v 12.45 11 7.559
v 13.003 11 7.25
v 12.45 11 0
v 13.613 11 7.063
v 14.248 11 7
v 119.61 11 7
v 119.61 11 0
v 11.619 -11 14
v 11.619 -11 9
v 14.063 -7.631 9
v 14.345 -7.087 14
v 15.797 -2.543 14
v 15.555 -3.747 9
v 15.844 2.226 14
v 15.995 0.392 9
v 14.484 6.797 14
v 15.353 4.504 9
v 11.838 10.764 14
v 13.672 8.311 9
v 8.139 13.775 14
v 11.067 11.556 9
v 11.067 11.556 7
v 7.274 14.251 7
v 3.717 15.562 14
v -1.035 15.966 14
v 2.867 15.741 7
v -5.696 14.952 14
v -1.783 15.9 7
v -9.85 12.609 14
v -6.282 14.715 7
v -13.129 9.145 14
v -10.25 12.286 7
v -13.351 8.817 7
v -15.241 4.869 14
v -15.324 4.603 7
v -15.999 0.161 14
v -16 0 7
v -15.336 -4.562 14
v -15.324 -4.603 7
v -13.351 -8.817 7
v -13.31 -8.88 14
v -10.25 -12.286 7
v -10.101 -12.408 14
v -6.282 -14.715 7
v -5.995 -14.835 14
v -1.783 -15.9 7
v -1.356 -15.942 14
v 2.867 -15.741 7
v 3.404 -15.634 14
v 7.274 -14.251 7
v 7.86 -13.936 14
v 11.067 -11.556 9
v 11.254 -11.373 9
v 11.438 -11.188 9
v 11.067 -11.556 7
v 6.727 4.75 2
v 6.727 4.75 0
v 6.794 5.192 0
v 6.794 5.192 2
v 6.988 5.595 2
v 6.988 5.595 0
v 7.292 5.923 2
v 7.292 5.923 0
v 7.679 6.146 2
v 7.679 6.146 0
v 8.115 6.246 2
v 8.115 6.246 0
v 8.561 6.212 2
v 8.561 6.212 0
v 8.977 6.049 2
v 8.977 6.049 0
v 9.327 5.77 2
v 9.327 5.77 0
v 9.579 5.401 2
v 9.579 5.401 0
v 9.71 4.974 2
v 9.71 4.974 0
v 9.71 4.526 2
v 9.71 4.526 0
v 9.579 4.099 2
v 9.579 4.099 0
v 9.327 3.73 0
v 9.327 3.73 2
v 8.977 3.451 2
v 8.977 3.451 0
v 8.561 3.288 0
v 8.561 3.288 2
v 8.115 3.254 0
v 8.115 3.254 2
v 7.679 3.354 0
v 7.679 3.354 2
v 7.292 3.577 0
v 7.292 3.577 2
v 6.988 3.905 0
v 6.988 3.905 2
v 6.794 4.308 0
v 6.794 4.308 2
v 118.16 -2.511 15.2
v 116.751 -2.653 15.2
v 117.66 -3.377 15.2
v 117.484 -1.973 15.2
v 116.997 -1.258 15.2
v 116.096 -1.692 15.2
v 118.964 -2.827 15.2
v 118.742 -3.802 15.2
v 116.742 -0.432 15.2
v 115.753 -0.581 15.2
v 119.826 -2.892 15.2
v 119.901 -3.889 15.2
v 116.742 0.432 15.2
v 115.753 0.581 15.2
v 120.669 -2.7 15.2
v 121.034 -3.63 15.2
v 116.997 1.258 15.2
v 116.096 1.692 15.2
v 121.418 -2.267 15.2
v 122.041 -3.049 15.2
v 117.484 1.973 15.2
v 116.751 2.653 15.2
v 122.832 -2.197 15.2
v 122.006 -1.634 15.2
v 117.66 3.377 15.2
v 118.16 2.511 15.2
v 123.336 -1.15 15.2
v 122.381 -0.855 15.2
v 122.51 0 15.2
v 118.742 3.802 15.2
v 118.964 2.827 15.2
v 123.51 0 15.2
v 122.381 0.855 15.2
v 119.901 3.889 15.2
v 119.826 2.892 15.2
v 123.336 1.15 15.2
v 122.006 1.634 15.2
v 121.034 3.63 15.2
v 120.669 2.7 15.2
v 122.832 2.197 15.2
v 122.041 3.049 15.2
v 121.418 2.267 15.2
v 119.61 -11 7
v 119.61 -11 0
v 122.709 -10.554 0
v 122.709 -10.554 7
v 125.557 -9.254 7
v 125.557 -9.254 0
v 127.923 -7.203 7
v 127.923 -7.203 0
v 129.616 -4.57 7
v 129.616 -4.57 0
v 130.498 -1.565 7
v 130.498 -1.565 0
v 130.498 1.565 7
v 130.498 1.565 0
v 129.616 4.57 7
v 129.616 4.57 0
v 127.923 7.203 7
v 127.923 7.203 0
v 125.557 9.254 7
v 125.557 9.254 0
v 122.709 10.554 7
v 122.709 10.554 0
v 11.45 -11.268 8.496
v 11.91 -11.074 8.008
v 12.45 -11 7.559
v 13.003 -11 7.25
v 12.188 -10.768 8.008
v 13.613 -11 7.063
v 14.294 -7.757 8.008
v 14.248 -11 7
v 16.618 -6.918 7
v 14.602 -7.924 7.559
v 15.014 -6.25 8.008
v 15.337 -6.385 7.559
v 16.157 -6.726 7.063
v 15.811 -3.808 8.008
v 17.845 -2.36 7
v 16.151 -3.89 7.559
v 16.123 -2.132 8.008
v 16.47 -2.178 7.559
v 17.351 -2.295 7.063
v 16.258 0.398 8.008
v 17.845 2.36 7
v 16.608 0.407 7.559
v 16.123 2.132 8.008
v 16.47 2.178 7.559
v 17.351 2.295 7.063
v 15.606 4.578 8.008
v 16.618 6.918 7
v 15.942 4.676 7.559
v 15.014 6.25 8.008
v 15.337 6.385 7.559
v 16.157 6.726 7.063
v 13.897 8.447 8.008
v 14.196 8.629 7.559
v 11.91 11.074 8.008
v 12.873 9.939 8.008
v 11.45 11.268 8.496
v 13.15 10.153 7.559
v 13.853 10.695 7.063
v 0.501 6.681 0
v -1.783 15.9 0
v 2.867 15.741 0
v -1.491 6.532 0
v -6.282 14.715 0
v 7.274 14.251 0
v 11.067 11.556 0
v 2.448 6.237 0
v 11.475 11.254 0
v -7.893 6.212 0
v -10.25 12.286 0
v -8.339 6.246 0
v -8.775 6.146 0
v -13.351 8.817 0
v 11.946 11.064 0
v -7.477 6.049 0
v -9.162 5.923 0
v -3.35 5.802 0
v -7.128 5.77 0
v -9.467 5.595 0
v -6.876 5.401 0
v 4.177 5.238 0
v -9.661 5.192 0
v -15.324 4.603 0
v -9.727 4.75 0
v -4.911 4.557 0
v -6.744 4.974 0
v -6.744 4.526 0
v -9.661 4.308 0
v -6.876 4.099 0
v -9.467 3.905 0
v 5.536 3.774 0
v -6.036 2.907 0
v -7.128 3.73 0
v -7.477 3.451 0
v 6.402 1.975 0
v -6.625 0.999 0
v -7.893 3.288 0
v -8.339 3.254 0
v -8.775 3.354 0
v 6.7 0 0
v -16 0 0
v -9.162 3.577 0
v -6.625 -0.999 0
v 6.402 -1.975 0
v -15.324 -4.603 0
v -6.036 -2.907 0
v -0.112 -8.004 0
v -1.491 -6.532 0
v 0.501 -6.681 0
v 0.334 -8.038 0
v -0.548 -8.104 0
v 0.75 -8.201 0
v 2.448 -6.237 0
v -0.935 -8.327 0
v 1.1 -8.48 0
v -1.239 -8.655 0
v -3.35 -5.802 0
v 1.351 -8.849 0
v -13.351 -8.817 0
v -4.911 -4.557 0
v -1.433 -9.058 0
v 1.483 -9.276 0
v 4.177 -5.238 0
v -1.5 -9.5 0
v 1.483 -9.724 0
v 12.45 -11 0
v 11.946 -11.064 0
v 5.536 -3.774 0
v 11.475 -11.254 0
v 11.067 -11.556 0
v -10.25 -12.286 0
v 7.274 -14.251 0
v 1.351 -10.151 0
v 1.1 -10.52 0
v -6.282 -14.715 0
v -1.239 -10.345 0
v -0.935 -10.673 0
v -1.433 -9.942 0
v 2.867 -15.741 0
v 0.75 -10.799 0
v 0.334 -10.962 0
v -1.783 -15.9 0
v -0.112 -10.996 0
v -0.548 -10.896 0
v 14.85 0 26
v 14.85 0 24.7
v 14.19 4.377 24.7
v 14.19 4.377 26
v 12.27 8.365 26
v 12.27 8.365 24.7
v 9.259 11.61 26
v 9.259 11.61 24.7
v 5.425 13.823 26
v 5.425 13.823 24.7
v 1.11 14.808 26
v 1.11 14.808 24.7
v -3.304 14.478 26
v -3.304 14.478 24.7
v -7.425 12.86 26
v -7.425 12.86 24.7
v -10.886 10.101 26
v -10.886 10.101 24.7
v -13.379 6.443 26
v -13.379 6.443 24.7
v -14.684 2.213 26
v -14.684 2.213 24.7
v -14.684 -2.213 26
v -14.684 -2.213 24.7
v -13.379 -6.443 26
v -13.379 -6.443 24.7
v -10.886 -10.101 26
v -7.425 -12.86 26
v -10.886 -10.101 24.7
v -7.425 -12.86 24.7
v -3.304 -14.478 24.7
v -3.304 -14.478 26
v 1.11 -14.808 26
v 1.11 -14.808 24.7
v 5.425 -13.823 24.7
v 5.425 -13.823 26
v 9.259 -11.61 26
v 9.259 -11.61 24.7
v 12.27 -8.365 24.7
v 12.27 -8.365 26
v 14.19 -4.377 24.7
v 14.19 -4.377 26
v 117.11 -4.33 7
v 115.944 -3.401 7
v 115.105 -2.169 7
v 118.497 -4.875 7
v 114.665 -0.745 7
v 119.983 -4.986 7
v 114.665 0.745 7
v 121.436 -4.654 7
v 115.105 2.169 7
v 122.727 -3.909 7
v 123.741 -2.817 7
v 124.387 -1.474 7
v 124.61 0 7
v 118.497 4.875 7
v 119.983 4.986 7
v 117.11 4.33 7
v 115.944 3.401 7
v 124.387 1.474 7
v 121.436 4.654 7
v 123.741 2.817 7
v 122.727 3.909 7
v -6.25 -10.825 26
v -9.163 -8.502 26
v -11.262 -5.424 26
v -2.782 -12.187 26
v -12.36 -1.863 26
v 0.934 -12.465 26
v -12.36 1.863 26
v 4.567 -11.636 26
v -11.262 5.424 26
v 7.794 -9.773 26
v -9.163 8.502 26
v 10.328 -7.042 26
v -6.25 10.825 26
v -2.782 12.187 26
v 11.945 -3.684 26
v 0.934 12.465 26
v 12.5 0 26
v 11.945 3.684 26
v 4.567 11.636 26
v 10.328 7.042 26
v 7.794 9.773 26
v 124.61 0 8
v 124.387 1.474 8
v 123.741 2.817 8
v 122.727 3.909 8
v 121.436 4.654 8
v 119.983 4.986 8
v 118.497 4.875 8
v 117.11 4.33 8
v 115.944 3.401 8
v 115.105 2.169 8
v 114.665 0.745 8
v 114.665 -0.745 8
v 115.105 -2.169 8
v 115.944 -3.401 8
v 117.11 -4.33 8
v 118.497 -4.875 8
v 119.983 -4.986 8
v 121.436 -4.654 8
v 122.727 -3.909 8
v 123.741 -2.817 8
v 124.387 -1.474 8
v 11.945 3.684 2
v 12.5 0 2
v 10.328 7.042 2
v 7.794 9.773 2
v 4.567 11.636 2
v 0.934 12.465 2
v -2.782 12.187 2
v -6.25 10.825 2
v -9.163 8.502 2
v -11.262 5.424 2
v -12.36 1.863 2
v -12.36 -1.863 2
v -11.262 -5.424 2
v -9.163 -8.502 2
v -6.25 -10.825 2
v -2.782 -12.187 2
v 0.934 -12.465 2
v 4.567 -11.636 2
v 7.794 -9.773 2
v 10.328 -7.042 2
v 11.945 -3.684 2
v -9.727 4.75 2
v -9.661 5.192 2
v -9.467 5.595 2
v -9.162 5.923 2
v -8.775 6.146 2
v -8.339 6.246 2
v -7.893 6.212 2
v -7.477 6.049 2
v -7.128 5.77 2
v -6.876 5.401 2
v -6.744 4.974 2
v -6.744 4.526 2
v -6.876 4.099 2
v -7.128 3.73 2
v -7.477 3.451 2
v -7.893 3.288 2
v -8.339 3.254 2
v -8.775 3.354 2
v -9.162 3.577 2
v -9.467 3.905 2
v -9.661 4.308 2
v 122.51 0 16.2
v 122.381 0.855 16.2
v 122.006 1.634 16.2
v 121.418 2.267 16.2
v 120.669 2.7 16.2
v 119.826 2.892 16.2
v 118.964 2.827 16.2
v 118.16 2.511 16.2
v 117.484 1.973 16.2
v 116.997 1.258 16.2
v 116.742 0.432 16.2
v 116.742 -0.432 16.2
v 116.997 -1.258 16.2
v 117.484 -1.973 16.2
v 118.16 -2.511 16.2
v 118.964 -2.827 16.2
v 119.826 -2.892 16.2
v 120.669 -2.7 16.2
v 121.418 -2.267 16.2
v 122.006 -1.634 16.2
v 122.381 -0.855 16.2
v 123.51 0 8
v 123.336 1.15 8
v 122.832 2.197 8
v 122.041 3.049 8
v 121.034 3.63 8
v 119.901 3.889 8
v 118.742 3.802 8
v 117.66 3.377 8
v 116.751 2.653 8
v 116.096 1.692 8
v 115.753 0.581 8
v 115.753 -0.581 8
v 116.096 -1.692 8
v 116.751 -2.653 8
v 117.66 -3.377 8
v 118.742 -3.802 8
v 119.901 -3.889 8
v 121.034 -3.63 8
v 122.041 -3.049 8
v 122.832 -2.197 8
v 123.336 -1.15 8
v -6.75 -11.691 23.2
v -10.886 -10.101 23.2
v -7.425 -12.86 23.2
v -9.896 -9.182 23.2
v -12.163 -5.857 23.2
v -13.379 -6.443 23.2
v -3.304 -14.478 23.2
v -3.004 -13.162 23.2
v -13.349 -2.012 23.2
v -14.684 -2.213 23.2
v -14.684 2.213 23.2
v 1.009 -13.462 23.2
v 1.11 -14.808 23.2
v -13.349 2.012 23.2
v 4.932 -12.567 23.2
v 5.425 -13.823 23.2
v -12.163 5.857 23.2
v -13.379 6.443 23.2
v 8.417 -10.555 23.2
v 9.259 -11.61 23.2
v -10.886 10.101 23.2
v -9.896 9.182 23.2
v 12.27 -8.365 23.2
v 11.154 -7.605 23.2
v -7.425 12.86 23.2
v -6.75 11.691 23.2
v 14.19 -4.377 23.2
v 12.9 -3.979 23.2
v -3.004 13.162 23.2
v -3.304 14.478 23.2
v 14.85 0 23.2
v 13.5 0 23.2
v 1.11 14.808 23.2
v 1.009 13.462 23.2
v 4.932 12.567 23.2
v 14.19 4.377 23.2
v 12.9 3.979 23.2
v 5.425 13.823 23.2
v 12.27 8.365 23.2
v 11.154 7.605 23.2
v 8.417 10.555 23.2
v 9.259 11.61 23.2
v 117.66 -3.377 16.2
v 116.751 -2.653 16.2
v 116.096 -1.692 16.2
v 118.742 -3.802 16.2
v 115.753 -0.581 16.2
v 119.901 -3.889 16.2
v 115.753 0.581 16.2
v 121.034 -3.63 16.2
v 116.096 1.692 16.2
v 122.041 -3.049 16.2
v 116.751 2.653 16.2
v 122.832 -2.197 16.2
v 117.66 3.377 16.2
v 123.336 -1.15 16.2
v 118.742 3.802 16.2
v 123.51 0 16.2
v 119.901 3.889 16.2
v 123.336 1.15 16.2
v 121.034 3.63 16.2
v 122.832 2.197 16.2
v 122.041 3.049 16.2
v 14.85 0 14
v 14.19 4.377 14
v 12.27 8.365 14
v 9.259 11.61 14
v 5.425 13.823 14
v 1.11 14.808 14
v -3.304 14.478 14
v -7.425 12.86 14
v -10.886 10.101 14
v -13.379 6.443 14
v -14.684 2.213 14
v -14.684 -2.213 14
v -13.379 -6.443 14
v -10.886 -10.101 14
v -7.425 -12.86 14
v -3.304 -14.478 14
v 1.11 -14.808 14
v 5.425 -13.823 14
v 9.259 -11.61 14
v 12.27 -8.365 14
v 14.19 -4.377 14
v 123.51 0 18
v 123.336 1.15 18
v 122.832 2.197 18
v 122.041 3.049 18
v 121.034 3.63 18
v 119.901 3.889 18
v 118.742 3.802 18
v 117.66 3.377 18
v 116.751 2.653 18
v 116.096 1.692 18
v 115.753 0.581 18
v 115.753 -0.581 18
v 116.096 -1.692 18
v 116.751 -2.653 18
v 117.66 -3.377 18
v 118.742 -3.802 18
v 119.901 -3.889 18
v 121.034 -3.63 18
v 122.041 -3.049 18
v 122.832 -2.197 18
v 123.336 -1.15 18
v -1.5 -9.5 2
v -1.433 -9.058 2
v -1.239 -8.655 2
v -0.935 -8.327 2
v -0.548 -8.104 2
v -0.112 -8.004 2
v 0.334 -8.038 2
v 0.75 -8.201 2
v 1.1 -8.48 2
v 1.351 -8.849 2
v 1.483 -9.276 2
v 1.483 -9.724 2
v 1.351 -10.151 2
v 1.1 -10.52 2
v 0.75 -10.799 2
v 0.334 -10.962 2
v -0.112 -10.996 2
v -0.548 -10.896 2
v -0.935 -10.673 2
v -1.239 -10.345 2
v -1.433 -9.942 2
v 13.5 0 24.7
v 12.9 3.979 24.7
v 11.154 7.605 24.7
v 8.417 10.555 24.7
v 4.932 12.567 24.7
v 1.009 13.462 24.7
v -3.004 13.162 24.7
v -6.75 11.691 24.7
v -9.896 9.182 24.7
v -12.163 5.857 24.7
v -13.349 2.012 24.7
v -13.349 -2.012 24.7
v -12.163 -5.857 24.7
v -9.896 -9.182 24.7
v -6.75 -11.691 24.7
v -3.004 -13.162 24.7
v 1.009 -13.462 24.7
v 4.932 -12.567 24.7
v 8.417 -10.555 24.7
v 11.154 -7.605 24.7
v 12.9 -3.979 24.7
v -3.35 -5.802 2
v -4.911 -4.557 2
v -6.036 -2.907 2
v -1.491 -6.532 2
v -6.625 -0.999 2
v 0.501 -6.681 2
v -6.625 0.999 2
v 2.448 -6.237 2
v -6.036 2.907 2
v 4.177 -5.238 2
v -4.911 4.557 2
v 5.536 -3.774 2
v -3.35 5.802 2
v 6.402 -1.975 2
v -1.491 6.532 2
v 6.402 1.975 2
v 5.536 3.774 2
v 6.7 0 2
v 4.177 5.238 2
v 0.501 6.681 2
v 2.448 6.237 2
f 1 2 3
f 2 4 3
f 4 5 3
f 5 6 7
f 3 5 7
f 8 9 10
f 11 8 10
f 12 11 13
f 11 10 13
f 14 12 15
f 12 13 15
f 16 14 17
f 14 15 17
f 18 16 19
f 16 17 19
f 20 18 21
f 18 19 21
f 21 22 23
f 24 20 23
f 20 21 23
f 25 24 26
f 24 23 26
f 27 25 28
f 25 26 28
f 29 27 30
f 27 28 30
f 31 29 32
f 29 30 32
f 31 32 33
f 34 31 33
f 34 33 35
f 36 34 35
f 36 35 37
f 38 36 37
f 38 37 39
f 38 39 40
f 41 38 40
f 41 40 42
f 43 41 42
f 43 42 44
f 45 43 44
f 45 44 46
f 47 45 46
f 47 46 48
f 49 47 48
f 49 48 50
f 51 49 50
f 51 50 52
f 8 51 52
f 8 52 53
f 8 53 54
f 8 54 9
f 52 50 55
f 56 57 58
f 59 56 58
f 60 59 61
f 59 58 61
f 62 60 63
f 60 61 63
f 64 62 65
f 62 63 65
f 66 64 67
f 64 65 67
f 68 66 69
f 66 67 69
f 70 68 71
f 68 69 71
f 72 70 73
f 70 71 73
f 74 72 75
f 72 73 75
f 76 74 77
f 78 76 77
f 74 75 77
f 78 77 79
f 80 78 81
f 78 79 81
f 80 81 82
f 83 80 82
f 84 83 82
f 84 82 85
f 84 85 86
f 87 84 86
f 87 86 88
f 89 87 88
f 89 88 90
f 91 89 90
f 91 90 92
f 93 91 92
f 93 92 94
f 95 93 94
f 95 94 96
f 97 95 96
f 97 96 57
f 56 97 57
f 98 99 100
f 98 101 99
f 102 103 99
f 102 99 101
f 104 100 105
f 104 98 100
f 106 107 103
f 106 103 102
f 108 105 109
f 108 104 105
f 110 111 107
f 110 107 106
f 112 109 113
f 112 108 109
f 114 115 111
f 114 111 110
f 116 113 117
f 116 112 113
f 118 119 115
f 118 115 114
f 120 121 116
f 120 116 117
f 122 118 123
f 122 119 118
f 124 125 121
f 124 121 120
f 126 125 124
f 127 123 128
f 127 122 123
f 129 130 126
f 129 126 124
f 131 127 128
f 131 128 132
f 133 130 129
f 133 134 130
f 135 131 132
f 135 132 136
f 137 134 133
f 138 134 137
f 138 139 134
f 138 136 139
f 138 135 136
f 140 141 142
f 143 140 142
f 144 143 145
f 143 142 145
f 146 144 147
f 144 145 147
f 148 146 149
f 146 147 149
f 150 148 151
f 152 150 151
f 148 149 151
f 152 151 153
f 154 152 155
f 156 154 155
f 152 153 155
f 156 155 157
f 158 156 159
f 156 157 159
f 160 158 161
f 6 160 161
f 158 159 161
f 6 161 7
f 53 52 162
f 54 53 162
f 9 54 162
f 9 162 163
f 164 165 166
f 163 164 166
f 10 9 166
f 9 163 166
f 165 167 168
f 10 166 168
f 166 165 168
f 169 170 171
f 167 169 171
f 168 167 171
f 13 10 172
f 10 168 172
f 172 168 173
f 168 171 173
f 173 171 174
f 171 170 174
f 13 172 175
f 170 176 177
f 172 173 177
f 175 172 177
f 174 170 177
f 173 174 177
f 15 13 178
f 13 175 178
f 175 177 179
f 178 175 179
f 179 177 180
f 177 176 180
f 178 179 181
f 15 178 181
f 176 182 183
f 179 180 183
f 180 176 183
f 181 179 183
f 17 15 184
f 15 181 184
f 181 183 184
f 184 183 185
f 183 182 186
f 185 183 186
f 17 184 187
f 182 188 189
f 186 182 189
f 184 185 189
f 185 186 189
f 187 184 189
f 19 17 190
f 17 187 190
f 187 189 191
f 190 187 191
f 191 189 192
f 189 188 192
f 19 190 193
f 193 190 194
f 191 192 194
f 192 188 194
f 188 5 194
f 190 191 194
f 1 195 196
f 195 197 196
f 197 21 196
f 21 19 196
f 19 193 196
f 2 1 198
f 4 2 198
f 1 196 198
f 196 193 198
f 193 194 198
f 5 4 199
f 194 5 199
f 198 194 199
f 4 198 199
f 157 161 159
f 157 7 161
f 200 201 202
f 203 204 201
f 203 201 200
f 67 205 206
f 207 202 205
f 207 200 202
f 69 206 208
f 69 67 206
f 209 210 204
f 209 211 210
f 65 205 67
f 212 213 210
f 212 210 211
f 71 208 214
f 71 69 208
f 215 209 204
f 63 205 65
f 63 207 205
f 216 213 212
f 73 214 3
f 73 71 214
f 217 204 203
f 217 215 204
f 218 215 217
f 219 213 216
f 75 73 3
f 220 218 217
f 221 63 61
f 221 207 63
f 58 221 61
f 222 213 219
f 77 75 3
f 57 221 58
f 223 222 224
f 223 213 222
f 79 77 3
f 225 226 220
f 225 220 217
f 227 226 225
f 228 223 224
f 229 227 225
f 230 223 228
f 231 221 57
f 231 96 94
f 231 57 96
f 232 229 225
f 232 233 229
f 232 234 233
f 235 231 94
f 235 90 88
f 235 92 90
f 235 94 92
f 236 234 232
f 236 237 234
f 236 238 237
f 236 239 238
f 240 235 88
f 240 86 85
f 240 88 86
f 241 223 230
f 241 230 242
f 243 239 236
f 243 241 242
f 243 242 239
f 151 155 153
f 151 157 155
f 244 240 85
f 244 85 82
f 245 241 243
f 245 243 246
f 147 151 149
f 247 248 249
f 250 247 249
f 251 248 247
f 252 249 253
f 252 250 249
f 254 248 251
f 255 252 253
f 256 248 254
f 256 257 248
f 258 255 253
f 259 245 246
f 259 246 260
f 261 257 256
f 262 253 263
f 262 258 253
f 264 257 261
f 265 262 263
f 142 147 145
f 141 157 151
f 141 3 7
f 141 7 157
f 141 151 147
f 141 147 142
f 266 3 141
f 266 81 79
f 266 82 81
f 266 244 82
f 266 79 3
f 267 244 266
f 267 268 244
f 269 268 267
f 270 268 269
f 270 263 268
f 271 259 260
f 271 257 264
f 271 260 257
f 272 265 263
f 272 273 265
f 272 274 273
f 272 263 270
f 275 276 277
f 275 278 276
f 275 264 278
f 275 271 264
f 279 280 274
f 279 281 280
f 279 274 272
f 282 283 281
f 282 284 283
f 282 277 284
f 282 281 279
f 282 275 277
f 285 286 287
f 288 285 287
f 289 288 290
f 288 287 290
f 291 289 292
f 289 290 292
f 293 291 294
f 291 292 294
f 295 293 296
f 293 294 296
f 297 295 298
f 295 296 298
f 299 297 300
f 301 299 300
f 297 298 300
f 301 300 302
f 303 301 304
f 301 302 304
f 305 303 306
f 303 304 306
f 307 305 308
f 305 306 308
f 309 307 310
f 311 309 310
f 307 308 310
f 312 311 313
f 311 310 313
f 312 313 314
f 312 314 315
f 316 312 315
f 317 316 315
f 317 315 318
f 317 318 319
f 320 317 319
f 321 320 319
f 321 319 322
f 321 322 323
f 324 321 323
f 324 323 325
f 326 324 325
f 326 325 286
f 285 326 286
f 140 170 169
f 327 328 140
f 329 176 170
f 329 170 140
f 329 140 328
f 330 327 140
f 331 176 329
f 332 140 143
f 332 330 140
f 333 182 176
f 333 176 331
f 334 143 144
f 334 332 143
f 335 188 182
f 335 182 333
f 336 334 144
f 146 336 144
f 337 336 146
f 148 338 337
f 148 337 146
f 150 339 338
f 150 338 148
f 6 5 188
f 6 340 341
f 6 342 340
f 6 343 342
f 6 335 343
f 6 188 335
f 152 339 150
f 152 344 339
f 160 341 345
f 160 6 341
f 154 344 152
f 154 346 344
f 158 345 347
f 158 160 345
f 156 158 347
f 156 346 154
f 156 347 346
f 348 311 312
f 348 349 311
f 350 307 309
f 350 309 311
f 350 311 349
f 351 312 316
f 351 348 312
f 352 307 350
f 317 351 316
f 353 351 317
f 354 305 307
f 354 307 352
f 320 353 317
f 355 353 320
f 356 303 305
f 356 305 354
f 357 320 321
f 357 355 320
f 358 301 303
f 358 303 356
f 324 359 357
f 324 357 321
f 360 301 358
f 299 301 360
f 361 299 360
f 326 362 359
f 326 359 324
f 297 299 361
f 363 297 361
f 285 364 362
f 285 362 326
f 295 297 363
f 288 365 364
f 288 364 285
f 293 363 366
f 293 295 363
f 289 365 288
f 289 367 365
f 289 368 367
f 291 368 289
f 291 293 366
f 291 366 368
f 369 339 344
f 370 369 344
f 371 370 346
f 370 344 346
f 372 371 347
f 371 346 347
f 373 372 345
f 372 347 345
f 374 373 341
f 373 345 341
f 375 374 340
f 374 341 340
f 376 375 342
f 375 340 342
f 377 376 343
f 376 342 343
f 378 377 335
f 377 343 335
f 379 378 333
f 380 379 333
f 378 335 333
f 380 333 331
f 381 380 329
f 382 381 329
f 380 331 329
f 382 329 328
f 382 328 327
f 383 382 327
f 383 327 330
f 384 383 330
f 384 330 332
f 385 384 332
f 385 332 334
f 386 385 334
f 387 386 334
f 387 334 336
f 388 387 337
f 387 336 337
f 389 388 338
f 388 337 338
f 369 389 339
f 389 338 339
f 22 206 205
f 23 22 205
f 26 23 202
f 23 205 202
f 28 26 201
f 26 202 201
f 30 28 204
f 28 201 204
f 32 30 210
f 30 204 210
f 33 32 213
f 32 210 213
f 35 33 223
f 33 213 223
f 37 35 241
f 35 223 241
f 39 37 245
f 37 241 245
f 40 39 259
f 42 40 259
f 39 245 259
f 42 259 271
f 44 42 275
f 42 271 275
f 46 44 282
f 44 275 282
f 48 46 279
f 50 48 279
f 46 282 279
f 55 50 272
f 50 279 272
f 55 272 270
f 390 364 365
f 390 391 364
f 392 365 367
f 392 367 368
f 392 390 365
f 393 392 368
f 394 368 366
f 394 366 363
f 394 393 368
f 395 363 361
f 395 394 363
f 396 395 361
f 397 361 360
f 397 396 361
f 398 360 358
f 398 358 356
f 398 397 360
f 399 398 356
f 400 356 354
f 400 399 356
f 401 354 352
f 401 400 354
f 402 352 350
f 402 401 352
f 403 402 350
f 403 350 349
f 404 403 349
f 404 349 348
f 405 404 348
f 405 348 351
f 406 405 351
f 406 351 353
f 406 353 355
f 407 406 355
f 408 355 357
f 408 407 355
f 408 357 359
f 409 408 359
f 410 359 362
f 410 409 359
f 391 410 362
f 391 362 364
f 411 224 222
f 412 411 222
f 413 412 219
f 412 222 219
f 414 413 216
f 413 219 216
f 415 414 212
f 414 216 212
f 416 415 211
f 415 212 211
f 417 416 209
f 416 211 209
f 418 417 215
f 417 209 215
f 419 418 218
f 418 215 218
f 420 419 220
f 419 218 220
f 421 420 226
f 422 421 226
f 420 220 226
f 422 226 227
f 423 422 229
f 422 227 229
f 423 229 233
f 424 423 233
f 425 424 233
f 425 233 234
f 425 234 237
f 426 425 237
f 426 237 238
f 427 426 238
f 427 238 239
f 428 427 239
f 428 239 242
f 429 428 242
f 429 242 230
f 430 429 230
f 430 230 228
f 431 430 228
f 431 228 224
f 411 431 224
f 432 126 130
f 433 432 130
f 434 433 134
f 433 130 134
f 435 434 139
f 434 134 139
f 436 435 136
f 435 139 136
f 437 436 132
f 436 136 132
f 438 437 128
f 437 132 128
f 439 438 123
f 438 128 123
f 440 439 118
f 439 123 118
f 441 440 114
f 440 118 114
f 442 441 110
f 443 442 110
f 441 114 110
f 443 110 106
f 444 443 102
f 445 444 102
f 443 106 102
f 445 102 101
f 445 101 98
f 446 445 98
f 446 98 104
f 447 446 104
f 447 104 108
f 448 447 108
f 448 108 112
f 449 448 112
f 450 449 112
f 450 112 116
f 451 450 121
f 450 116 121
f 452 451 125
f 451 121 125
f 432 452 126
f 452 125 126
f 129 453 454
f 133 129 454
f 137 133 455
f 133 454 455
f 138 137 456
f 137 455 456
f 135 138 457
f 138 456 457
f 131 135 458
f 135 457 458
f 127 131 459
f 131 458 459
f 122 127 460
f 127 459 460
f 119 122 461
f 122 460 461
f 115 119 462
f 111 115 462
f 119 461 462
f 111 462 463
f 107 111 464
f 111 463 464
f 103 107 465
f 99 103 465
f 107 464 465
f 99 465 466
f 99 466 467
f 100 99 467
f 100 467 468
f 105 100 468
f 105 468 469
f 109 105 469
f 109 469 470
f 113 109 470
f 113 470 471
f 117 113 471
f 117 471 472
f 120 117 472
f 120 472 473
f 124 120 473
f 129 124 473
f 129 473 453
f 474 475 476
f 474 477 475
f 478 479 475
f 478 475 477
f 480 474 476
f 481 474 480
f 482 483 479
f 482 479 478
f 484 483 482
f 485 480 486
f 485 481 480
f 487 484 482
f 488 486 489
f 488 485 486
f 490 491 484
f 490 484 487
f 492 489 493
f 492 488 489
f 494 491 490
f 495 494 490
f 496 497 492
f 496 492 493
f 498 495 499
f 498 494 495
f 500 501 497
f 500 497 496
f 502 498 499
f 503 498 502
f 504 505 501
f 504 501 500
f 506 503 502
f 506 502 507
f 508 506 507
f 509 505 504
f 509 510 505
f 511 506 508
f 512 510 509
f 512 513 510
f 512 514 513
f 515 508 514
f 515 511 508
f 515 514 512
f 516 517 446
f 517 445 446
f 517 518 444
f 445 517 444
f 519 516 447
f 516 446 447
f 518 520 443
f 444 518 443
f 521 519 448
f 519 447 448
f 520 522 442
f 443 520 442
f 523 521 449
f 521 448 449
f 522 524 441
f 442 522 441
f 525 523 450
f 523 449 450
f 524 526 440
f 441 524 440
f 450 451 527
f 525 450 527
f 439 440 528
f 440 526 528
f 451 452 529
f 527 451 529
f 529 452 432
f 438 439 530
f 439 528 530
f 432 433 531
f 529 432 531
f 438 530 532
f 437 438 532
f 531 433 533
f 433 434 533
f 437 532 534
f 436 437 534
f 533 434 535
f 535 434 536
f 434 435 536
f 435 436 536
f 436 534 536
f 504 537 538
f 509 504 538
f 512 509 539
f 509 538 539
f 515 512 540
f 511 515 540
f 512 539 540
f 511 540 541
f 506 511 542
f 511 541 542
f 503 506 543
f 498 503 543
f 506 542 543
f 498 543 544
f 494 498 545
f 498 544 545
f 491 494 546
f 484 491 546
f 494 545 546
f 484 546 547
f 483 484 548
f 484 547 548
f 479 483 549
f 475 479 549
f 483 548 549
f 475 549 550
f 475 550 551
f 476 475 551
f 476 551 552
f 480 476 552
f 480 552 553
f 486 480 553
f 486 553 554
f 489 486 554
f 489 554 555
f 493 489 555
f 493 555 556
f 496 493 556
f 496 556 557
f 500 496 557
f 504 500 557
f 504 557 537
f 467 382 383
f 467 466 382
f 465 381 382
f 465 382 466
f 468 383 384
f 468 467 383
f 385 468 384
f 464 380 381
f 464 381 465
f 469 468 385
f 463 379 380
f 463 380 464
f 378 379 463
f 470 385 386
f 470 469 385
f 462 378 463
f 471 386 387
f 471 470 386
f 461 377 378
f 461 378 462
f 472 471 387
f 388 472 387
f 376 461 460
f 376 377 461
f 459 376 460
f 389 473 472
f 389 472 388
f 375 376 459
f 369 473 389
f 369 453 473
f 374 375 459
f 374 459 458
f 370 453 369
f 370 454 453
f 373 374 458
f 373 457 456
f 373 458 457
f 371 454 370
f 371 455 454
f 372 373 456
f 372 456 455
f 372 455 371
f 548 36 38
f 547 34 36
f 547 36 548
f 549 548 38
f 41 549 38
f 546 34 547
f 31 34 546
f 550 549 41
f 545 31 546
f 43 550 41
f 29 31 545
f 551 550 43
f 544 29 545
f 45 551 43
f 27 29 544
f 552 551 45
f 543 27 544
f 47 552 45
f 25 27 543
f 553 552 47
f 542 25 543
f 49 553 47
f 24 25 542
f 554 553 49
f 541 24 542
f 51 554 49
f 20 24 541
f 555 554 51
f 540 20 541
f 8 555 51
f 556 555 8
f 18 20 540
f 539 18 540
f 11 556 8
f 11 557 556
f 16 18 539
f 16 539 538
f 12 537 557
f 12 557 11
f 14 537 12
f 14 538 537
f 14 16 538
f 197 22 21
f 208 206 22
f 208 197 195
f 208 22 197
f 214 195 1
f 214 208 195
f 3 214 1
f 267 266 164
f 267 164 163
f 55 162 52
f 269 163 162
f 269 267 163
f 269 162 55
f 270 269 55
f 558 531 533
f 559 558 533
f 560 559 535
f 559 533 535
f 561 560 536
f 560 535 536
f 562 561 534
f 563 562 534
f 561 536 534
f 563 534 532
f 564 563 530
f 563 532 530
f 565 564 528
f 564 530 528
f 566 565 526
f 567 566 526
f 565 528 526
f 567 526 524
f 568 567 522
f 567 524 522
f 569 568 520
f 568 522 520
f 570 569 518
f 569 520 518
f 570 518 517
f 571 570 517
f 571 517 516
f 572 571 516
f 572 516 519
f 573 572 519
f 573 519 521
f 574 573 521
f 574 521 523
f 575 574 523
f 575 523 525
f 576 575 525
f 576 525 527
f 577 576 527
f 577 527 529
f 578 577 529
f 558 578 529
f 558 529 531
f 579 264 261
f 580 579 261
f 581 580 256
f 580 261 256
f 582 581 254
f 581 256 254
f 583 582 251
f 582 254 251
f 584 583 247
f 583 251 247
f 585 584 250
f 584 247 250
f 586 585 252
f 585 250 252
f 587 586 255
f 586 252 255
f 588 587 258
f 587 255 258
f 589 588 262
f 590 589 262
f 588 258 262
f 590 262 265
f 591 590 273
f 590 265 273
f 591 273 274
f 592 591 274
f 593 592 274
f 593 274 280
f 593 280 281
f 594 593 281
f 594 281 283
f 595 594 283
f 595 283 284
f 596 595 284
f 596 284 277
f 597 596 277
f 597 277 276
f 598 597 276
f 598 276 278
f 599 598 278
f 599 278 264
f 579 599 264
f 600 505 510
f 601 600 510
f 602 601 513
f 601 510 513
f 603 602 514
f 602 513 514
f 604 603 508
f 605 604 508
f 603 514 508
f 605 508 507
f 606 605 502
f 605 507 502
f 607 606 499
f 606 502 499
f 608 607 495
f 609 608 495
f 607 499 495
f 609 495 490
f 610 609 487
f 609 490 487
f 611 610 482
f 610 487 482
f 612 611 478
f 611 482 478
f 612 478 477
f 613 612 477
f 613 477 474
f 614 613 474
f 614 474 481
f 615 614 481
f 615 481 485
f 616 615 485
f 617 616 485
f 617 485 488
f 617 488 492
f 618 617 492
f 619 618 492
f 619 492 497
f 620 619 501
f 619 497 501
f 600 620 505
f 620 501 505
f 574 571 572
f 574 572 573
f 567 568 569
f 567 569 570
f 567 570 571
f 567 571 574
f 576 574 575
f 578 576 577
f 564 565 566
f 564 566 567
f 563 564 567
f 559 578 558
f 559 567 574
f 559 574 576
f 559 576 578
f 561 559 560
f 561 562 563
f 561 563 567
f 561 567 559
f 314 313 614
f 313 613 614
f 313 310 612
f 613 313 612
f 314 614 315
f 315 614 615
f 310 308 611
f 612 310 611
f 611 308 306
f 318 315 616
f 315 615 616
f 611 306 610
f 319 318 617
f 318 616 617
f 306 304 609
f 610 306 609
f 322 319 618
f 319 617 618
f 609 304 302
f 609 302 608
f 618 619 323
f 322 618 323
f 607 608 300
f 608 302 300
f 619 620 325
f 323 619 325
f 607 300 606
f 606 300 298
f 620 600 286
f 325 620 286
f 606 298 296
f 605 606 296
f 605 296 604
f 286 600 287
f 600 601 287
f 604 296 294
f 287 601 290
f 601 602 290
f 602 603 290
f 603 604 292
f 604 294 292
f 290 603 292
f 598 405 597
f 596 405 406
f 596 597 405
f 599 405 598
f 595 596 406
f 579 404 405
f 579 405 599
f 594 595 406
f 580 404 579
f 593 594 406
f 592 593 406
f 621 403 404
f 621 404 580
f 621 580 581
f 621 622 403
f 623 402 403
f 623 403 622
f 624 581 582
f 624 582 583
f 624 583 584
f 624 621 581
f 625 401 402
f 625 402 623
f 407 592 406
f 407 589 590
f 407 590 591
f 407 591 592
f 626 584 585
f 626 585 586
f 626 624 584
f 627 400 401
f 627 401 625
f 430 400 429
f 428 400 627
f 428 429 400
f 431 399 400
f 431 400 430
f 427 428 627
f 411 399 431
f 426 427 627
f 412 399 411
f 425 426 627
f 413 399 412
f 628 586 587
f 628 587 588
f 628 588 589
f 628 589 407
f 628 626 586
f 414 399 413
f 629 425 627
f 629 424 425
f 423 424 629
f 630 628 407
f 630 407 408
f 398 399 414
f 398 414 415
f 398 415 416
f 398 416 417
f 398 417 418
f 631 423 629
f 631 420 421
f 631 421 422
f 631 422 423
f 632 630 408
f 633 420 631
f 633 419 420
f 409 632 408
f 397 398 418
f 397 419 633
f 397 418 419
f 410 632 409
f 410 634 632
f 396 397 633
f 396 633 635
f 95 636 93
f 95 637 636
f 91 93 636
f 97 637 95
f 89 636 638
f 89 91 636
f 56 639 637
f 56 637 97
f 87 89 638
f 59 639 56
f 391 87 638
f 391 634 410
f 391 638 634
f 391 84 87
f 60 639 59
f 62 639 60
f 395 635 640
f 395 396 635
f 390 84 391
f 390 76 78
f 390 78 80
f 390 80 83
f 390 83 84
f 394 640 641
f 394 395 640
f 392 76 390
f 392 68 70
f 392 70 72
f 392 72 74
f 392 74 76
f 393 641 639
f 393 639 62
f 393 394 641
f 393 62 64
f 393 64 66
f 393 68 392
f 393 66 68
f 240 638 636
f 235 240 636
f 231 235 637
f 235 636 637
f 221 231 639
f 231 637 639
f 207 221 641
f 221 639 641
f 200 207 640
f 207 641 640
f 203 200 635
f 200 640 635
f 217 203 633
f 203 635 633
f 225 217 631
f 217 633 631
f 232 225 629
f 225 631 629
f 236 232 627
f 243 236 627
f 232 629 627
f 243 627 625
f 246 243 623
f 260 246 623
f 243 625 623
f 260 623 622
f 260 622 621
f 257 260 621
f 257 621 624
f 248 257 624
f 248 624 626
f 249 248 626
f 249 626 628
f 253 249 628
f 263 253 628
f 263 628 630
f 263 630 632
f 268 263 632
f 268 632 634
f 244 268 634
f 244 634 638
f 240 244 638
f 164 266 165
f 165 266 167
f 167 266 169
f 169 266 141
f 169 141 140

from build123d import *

# Parameters (mm, degrees)
EXTRUDE_1_DEPTH     = 7
SKETCH_2_R          = 6.7
CUT_EXTRUDE_1_DEPTH = 7
SKETCH_3_R          = 12.5
SKETCH_3_R_2        = 6.7
CUT_EXTRUDE_2_DEPTH = 5
SKETCH_4_R          = 16
SKETCH_4_R_2        = 12.5
EXTRUDE_2_DEPTH     = 7
SKETCH_5_R          = 14.850000000000001
SKETCH_5_R_2        = 12.5
EXTRUDE_3_DEPTH     = 12
SKETCH_6_R          = 5.000000000000004
EXTRUDE_4_DEPTH     = 1
SKETCH_7_R          = 3.899999999999998
EXTRUDE_5_DEPTH     = 10
FILLET_1_R          = 2
SKETCH_8_R          = 1.4999999999999998
SKETCH_8_R_2        = 1.5000000000000002
SKETCH_8_R_3        = 1.4999999999999991
CUT_EXTRUDE_3_DEPTH = 10
SKETCH_9_R          = 14.850000000000001
SKETCH_9_R_2        = 13.5
CUT_EXTRUDE_4_DEPTH = 1.5
SKETCH_10_R         = 3.899999999999998
SKETCH_10_R_2       = 2.9
CUT_EXTRUDE_5_DEPTH = 1


with BuildPart() as part:
    # 草图1 → 凸台-拉伸1 (new body)
    with BuildSketch(Plane.XY):
        with BuildLine():
            Line((119.60958057927934, 11), (11.61895003862225, 11))
            ThreePointArc((11.61895003862225, 11), (-16, 1.96e-15), (11.61895003862225, -11))
            Line((11.61895003862225, -11), (119.60958057927934, -11))
            ThreePointArc((119.60958057927934, -11), (130.60958057927934, 0), (119.60958057927934, 11))
        make_face()
    extrude(amount=EXTRUDE_1_DEPTH)

    # 草图2 → 切除-拉伸1 (cut)
    with BuildSketch(Plane.XY.offset(7)):
        Circle(SKETCH_2_R)
    extrude(amount=-CUT_EXTRUDE_1_DEPTH, mode=Mode.SUBTRACT)

    # 草图3 → 切除-拉伸2 (cut)
    with BuildSketch(Plane.XY.offset(7)):
        Circle(SKETCH_3_R)
        Circle(SKETCH_3_R_2, mode=Mode.SUBTRACT)
    extrude(amount=-CUT_EXTRUDE_2_DEPTH, mode=Mode.SUBTRACT)

    # 草图4 → 凸台-拉伸2 (add)
    with BuildSketch(Plane.XY.offset(7)):
        Circle(SKETCH_4_R)
        Circle(SKETCH_4_R_2, mode=Mode.SUBTRACT)
    extrude(amount=EXTRUDE_2_DEPTH)

    # 草图5 → 凸台-拉伸3 (add)
    with BuildSketch(Plane.XY.offset(14)):
        Circle(SKETCH_5_R)
        Circle(SKETCH_5_R_2, mode=Mode.SUBTRACT)
    extrude(amount=EXTRUDE_3_DEPTH)

    # 草图6 → 凸台-拉伸4 (add)
    with BuildSketch(Plane.XY.offset(7)):
        with Locations((119.60958057927934, 0)):
            Circle(SKETCH_6_R)
    extrude(amount=EXTRUDE_4_DEPTH)

    # 草图7 → 凸台-拉伸5 (add)
    with BuildSketch(Plane.XY.offset(8)):
        with Locations((119.60958057927934, 0)):
            Circle(SKETCH_7_R)
    extrude(amount=EXTRUDE_5_DEPTH)

    # 圆角1
    fillet_1_edges = [part.edges().sort_by_distance(p)[0] for p in [
        (11.618950038622248, -11.000000000000002, 3.5),
        (11.61895003862225, 11, 3.5),
        (14.864440800412844, 5.920168890413684, 7),
    ]]
    fillet(fillet_1_edges, radius=FILLET_1_R)

    # 草图8 → 切除-拉伸3 (cut)
    with BuildSketch(Plane(origin=(0, 0, 0), x_dir=(-1, 0, 0), z_dir=(0, 0, -1))):
        with Locations((0, -9.5)):
            Circle(SKETCH_8_R)
        with Locations((-8.227241335952145, 4.75000000000004)):
            Circle(SKETCH_8_R_2)
        with Locations((8.22724133595221, 4.749999999999924)):
            Circle(SKETCH_8_R_3)
    extrude(amount=-CUT_EXTRUDE_3_DEPTH, mode=Mode.SUBTRACT)

    # 草图9 → 切除-拉伸4 (cut)
    with BuildSketch(Plane.XY.offset(23.200000000000003)):
        Circle(SKETCH_9_R)
        Circle(SKETCH_9_R_2, mode=Mode.SUBTRACT)
    extrude(amount=CUT_EXTRUDE_4_DEPTH, mode=Mode.SUBTRACT)

    # 草图10 → 切除-拉伸5 (cut)
    with BuildSketch(Plane.XY.offset(15.200000000000001)):
        with Locations((119.60958057927934, 0)):
            Circle(SKETCH_10_R)
        with Locations((119.60958057927934, 0)):
            Circle(SKETCH_10_R_2, mode=Mode.SUBTRACT)
    extrude(amount=CUT_EXTRUDE_5_DEPTH, mode=Mode.SUBTRACT)


solid = part.part
